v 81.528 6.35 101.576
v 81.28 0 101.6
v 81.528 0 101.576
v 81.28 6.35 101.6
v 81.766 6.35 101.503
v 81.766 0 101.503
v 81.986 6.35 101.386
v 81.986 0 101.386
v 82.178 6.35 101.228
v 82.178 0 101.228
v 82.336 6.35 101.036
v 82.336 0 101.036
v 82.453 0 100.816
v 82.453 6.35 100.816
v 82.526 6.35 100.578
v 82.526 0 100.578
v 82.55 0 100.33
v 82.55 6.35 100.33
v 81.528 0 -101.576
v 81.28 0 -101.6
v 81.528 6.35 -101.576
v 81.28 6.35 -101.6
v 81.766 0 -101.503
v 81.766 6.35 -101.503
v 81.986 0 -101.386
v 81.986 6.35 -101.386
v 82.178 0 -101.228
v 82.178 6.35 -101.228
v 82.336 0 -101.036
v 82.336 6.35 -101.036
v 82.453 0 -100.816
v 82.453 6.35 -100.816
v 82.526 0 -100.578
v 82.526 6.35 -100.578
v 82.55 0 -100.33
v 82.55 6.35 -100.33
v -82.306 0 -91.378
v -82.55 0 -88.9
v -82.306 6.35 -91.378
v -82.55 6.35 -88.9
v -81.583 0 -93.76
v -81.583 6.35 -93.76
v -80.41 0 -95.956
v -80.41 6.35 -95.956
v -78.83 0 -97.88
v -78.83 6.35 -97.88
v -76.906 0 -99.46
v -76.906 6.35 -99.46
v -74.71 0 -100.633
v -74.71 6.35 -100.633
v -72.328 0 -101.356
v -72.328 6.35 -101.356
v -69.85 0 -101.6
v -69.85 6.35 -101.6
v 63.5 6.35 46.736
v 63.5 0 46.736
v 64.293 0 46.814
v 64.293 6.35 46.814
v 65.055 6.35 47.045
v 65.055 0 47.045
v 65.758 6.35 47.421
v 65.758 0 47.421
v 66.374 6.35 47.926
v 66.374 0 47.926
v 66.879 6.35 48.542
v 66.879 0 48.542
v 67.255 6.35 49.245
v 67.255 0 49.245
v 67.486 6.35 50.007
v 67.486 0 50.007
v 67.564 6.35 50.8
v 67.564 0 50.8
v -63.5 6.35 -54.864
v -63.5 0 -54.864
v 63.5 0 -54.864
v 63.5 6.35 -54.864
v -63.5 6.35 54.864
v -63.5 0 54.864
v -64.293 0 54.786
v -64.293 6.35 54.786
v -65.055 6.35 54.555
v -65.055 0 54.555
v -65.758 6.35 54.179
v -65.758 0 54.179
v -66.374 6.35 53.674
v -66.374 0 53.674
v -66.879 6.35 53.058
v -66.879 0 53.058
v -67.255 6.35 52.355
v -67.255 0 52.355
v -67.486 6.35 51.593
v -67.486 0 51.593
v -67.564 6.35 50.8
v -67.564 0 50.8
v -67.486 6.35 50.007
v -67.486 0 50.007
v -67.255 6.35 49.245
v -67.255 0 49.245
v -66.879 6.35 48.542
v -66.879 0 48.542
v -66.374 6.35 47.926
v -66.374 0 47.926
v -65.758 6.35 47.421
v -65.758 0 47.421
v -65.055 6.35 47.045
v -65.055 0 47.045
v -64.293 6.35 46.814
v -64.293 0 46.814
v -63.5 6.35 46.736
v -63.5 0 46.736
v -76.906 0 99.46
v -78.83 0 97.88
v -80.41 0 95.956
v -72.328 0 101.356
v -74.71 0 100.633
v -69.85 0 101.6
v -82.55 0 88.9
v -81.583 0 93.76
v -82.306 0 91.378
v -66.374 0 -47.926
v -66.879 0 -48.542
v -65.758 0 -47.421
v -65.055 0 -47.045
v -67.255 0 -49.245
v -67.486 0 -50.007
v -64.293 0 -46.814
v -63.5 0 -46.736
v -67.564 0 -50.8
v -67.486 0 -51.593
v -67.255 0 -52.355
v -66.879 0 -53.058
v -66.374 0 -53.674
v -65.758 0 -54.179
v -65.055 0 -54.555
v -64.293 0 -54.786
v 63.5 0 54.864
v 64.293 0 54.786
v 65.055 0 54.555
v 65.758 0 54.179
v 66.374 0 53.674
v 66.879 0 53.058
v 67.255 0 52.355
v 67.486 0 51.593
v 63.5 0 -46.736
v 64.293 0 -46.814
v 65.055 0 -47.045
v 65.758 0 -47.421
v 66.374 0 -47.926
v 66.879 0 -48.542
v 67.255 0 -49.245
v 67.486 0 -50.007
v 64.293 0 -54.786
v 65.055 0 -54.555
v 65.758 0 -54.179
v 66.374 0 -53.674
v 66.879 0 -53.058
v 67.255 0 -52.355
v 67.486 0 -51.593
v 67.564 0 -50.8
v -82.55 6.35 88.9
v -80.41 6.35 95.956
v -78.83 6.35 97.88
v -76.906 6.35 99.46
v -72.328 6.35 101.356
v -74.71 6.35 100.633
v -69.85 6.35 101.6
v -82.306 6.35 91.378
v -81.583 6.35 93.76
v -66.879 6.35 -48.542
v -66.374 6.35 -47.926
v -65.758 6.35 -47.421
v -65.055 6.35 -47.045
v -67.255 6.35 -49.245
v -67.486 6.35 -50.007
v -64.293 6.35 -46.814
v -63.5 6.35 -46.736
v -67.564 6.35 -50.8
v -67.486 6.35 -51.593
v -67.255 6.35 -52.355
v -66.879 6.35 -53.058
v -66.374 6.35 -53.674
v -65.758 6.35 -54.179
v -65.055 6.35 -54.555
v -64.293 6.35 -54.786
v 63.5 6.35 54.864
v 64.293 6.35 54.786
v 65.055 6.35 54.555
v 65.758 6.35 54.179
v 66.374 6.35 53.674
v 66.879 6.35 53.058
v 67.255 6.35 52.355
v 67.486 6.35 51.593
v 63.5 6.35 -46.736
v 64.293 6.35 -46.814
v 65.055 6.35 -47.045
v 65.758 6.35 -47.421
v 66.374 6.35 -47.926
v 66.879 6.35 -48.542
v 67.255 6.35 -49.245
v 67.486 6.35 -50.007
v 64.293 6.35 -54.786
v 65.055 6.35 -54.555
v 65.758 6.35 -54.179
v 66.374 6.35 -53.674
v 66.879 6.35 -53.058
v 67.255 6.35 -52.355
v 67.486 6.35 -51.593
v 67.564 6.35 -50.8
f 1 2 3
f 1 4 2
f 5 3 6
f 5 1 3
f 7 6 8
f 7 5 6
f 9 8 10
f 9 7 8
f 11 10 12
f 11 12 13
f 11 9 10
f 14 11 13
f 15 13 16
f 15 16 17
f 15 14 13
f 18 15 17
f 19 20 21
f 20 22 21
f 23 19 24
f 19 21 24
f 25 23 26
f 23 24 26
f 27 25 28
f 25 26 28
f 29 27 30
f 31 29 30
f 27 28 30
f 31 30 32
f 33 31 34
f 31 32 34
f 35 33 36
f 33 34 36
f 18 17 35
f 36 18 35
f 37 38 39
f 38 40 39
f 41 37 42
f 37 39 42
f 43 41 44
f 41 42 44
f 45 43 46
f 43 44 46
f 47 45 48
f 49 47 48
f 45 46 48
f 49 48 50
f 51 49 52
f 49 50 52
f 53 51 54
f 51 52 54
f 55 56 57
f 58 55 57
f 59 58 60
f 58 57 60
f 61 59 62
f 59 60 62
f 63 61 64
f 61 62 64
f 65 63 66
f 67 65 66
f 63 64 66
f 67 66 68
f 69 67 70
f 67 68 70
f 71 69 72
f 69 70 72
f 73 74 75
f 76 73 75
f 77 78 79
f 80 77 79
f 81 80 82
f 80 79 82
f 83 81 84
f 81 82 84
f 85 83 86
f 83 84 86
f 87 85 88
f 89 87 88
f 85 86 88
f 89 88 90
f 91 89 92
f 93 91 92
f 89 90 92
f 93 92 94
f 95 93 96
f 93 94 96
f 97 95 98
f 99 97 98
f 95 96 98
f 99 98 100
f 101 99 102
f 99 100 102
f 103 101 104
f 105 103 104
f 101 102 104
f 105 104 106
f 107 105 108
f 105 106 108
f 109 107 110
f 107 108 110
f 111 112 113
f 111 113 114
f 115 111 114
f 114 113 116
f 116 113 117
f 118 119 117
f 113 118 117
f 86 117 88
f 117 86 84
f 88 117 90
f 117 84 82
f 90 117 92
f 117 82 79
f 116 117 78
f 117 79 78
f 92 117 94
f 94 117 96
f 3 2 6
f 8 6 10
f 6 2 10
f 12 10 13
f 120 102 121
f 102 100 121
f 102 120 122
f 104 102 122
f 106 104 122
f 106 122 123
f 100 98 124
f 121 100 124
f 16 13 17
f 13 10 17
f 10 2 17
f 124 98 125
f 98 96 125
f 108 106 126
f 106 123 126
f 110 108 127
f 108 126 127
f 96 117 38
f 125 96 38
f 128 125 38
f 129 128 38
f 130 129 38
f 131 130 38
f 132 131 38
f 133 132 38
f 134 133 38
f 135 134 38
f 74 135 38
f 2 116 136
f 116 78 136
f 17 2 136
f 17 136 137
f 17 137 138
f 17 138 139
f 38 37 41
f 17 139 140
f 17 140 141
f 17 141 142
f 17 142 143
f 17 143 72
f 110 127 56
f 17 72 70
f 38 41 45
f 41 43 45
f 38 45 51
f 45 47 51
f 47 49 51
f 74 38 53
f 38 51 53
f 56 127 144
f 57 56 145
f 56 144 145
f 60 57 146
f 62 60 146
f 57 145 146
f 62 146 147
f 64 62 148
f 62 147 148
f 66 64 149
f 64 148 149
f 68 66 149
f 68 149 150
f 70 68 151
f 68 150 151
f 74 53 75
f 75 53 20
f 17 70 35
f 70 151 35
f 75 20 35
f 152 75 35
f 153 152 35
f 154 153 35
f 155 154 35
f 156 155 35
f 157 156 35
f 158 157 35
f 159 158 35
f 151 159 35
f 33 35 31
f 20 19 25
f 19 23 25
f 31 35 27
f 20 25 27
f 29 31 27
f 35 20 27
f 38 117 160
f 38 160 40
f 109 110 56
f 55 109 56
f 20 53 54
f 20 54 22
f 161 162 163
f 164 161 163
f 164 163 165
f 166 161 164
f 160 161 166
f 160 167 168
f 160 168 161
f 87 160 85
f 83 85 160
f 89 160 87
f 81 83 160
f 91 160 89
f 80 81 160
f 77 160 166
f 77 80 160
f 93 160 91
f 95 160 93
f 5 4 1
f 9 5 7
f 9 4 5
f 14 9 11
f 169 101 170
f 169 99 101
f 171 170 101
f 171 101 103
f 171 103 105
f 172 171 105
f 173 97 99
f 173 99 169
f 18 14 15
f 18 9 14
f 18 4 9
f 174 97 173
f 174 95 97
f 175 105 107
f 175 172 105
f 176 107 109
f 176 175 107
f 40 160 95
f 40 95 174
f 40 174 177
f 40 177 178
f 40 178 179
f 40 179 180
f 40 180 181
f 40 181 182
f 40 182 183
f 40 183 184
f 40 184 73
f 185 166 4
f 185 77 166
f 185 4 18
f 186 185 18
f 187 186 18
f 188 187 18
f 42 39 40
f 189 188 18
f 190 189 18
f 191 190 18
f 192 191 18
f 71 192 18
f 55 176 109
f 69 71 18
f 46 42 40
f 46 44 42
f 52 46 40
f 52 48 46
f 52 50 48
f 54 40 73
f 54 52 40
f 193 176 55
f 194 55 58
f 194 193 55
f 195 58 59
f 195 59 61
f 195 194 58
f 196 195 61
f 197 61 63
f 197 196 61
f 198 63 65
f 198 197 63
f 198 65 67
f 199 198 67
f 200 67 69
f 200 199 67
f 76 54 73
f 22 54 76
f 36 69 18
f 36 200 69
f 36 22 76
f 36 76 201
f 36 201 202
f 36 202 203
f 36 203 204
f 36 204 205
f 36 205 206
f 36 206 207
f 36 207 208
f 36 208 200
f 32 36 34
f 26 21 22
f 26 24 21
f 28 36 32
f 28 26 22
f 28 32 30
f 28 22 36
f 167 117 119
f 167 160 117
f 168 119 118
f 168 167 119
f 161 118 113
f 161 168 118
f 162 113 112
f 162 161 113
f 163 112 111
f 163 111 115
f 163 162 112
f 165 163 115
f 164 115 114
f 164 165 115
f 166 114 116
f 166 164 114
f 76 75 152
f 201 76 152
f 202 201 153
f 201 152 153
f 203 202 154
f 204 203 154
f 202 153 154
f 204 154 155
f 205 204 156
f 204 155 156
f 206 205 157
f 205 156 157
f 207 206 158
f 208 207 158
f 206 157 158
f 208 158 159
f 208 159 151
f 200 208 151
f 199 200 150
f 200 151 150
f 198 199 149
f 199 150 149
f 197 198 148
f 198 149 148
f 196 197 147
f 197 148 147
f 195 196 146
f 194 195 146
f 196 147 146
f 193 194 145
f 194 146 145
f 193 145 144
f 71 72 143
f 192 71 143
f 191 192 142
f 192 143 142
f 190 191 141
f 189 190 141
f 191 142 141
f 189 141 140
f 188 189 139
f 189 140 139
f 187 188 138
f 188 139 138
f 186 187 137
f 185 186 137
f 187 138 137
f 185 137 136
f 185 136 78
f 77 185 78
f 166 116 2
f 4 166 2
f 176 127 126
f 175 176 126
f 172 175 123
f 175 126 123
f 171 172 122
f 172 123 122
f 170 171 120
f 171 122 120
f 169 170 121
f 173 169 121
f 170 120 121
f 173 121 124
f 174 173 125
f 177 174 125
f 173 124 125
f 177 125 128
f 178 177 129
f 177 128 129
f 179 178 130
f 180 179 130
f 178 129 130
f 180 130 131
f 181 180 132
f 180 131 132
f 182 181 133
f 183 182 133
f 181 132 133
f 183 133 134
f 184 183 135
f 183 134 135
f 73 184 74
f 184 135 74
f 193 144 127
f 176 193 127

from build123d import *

# Parameters (mm, degrees)
SKETCH1_W           = 165.1
SKETCH1_H           = 203.2
BOSS_EXTRUDE1_DEPTH = 6.35
FILLET1_R           = 12.7
FILLET2_R           = 1.27


with BuildPart() as part:
    # Sketch1 → Boss-Extrude1 (new body)
    with BuildSketch(Plane(origin=(0, 0, 0), x_dir=(1, 0, 0), z_dir=(0, 1, 0))):
        Rectangle(SKETCH1_W, SKETCH1_H)
        with BuildLine():
            ThreePointArc((67.564, -50.8), (66.373681959, -53.673681959), (63.5, -54.864))
            Line((63.5, -54.864), (-63.5, -54.864))
            ThreePointArc((-63.5, -54.864), (-67.564, -50.8), (-63.5, -46.736))
            Line((-63.5, -46.736), (63.5, -46.736))
            ThreePointArc((63.5, -46.736), (66.373681959, -47.926318041), (67.564, -50.8))
        make_face(mode=Mode.SUBTRACT)
        with BuildLine():
            ThreePointArc((-63.5, 46.736), (-67.564, 50.8), (-63.5, 54.864))
            Line((-63.5, 54.864), (63.5, 54.864))
            ThreePointArc((63.5, 54.864), (66.373681959, 53.673681959), (67.564, 50.8))
            ThreePointArc((67.564, 50.8), (66.373681959, 47.926318041), (63.5, 46.736))
            Line((63.5, 46.736), (-63.5, 46.736))
        make_face(mode=Mode.SUBTRACT)
    extrude(amount=BOSS_EXTRUDE1_DEPTH)

    # Fillet1
    fillet1_edges = [part.edges().sort_by_distance(p)[0] for p in [
        (-82.55, 3.175, 101.6),
        (-82.55, 3.175, -101.6),
    ]]
    fillet(fillet1_edges, radius=FILLET1_R)

    # Fillet2
    fillet2_edges = [part.edges().sort_by_distance(p)[0] for p in [
        (82.55, 3.175, -101.6),
        (82.55, 3.175, 101.6),
    ]]
    fillet(fillet2_edges, radius=FILLET2_R)


solid = part.part
